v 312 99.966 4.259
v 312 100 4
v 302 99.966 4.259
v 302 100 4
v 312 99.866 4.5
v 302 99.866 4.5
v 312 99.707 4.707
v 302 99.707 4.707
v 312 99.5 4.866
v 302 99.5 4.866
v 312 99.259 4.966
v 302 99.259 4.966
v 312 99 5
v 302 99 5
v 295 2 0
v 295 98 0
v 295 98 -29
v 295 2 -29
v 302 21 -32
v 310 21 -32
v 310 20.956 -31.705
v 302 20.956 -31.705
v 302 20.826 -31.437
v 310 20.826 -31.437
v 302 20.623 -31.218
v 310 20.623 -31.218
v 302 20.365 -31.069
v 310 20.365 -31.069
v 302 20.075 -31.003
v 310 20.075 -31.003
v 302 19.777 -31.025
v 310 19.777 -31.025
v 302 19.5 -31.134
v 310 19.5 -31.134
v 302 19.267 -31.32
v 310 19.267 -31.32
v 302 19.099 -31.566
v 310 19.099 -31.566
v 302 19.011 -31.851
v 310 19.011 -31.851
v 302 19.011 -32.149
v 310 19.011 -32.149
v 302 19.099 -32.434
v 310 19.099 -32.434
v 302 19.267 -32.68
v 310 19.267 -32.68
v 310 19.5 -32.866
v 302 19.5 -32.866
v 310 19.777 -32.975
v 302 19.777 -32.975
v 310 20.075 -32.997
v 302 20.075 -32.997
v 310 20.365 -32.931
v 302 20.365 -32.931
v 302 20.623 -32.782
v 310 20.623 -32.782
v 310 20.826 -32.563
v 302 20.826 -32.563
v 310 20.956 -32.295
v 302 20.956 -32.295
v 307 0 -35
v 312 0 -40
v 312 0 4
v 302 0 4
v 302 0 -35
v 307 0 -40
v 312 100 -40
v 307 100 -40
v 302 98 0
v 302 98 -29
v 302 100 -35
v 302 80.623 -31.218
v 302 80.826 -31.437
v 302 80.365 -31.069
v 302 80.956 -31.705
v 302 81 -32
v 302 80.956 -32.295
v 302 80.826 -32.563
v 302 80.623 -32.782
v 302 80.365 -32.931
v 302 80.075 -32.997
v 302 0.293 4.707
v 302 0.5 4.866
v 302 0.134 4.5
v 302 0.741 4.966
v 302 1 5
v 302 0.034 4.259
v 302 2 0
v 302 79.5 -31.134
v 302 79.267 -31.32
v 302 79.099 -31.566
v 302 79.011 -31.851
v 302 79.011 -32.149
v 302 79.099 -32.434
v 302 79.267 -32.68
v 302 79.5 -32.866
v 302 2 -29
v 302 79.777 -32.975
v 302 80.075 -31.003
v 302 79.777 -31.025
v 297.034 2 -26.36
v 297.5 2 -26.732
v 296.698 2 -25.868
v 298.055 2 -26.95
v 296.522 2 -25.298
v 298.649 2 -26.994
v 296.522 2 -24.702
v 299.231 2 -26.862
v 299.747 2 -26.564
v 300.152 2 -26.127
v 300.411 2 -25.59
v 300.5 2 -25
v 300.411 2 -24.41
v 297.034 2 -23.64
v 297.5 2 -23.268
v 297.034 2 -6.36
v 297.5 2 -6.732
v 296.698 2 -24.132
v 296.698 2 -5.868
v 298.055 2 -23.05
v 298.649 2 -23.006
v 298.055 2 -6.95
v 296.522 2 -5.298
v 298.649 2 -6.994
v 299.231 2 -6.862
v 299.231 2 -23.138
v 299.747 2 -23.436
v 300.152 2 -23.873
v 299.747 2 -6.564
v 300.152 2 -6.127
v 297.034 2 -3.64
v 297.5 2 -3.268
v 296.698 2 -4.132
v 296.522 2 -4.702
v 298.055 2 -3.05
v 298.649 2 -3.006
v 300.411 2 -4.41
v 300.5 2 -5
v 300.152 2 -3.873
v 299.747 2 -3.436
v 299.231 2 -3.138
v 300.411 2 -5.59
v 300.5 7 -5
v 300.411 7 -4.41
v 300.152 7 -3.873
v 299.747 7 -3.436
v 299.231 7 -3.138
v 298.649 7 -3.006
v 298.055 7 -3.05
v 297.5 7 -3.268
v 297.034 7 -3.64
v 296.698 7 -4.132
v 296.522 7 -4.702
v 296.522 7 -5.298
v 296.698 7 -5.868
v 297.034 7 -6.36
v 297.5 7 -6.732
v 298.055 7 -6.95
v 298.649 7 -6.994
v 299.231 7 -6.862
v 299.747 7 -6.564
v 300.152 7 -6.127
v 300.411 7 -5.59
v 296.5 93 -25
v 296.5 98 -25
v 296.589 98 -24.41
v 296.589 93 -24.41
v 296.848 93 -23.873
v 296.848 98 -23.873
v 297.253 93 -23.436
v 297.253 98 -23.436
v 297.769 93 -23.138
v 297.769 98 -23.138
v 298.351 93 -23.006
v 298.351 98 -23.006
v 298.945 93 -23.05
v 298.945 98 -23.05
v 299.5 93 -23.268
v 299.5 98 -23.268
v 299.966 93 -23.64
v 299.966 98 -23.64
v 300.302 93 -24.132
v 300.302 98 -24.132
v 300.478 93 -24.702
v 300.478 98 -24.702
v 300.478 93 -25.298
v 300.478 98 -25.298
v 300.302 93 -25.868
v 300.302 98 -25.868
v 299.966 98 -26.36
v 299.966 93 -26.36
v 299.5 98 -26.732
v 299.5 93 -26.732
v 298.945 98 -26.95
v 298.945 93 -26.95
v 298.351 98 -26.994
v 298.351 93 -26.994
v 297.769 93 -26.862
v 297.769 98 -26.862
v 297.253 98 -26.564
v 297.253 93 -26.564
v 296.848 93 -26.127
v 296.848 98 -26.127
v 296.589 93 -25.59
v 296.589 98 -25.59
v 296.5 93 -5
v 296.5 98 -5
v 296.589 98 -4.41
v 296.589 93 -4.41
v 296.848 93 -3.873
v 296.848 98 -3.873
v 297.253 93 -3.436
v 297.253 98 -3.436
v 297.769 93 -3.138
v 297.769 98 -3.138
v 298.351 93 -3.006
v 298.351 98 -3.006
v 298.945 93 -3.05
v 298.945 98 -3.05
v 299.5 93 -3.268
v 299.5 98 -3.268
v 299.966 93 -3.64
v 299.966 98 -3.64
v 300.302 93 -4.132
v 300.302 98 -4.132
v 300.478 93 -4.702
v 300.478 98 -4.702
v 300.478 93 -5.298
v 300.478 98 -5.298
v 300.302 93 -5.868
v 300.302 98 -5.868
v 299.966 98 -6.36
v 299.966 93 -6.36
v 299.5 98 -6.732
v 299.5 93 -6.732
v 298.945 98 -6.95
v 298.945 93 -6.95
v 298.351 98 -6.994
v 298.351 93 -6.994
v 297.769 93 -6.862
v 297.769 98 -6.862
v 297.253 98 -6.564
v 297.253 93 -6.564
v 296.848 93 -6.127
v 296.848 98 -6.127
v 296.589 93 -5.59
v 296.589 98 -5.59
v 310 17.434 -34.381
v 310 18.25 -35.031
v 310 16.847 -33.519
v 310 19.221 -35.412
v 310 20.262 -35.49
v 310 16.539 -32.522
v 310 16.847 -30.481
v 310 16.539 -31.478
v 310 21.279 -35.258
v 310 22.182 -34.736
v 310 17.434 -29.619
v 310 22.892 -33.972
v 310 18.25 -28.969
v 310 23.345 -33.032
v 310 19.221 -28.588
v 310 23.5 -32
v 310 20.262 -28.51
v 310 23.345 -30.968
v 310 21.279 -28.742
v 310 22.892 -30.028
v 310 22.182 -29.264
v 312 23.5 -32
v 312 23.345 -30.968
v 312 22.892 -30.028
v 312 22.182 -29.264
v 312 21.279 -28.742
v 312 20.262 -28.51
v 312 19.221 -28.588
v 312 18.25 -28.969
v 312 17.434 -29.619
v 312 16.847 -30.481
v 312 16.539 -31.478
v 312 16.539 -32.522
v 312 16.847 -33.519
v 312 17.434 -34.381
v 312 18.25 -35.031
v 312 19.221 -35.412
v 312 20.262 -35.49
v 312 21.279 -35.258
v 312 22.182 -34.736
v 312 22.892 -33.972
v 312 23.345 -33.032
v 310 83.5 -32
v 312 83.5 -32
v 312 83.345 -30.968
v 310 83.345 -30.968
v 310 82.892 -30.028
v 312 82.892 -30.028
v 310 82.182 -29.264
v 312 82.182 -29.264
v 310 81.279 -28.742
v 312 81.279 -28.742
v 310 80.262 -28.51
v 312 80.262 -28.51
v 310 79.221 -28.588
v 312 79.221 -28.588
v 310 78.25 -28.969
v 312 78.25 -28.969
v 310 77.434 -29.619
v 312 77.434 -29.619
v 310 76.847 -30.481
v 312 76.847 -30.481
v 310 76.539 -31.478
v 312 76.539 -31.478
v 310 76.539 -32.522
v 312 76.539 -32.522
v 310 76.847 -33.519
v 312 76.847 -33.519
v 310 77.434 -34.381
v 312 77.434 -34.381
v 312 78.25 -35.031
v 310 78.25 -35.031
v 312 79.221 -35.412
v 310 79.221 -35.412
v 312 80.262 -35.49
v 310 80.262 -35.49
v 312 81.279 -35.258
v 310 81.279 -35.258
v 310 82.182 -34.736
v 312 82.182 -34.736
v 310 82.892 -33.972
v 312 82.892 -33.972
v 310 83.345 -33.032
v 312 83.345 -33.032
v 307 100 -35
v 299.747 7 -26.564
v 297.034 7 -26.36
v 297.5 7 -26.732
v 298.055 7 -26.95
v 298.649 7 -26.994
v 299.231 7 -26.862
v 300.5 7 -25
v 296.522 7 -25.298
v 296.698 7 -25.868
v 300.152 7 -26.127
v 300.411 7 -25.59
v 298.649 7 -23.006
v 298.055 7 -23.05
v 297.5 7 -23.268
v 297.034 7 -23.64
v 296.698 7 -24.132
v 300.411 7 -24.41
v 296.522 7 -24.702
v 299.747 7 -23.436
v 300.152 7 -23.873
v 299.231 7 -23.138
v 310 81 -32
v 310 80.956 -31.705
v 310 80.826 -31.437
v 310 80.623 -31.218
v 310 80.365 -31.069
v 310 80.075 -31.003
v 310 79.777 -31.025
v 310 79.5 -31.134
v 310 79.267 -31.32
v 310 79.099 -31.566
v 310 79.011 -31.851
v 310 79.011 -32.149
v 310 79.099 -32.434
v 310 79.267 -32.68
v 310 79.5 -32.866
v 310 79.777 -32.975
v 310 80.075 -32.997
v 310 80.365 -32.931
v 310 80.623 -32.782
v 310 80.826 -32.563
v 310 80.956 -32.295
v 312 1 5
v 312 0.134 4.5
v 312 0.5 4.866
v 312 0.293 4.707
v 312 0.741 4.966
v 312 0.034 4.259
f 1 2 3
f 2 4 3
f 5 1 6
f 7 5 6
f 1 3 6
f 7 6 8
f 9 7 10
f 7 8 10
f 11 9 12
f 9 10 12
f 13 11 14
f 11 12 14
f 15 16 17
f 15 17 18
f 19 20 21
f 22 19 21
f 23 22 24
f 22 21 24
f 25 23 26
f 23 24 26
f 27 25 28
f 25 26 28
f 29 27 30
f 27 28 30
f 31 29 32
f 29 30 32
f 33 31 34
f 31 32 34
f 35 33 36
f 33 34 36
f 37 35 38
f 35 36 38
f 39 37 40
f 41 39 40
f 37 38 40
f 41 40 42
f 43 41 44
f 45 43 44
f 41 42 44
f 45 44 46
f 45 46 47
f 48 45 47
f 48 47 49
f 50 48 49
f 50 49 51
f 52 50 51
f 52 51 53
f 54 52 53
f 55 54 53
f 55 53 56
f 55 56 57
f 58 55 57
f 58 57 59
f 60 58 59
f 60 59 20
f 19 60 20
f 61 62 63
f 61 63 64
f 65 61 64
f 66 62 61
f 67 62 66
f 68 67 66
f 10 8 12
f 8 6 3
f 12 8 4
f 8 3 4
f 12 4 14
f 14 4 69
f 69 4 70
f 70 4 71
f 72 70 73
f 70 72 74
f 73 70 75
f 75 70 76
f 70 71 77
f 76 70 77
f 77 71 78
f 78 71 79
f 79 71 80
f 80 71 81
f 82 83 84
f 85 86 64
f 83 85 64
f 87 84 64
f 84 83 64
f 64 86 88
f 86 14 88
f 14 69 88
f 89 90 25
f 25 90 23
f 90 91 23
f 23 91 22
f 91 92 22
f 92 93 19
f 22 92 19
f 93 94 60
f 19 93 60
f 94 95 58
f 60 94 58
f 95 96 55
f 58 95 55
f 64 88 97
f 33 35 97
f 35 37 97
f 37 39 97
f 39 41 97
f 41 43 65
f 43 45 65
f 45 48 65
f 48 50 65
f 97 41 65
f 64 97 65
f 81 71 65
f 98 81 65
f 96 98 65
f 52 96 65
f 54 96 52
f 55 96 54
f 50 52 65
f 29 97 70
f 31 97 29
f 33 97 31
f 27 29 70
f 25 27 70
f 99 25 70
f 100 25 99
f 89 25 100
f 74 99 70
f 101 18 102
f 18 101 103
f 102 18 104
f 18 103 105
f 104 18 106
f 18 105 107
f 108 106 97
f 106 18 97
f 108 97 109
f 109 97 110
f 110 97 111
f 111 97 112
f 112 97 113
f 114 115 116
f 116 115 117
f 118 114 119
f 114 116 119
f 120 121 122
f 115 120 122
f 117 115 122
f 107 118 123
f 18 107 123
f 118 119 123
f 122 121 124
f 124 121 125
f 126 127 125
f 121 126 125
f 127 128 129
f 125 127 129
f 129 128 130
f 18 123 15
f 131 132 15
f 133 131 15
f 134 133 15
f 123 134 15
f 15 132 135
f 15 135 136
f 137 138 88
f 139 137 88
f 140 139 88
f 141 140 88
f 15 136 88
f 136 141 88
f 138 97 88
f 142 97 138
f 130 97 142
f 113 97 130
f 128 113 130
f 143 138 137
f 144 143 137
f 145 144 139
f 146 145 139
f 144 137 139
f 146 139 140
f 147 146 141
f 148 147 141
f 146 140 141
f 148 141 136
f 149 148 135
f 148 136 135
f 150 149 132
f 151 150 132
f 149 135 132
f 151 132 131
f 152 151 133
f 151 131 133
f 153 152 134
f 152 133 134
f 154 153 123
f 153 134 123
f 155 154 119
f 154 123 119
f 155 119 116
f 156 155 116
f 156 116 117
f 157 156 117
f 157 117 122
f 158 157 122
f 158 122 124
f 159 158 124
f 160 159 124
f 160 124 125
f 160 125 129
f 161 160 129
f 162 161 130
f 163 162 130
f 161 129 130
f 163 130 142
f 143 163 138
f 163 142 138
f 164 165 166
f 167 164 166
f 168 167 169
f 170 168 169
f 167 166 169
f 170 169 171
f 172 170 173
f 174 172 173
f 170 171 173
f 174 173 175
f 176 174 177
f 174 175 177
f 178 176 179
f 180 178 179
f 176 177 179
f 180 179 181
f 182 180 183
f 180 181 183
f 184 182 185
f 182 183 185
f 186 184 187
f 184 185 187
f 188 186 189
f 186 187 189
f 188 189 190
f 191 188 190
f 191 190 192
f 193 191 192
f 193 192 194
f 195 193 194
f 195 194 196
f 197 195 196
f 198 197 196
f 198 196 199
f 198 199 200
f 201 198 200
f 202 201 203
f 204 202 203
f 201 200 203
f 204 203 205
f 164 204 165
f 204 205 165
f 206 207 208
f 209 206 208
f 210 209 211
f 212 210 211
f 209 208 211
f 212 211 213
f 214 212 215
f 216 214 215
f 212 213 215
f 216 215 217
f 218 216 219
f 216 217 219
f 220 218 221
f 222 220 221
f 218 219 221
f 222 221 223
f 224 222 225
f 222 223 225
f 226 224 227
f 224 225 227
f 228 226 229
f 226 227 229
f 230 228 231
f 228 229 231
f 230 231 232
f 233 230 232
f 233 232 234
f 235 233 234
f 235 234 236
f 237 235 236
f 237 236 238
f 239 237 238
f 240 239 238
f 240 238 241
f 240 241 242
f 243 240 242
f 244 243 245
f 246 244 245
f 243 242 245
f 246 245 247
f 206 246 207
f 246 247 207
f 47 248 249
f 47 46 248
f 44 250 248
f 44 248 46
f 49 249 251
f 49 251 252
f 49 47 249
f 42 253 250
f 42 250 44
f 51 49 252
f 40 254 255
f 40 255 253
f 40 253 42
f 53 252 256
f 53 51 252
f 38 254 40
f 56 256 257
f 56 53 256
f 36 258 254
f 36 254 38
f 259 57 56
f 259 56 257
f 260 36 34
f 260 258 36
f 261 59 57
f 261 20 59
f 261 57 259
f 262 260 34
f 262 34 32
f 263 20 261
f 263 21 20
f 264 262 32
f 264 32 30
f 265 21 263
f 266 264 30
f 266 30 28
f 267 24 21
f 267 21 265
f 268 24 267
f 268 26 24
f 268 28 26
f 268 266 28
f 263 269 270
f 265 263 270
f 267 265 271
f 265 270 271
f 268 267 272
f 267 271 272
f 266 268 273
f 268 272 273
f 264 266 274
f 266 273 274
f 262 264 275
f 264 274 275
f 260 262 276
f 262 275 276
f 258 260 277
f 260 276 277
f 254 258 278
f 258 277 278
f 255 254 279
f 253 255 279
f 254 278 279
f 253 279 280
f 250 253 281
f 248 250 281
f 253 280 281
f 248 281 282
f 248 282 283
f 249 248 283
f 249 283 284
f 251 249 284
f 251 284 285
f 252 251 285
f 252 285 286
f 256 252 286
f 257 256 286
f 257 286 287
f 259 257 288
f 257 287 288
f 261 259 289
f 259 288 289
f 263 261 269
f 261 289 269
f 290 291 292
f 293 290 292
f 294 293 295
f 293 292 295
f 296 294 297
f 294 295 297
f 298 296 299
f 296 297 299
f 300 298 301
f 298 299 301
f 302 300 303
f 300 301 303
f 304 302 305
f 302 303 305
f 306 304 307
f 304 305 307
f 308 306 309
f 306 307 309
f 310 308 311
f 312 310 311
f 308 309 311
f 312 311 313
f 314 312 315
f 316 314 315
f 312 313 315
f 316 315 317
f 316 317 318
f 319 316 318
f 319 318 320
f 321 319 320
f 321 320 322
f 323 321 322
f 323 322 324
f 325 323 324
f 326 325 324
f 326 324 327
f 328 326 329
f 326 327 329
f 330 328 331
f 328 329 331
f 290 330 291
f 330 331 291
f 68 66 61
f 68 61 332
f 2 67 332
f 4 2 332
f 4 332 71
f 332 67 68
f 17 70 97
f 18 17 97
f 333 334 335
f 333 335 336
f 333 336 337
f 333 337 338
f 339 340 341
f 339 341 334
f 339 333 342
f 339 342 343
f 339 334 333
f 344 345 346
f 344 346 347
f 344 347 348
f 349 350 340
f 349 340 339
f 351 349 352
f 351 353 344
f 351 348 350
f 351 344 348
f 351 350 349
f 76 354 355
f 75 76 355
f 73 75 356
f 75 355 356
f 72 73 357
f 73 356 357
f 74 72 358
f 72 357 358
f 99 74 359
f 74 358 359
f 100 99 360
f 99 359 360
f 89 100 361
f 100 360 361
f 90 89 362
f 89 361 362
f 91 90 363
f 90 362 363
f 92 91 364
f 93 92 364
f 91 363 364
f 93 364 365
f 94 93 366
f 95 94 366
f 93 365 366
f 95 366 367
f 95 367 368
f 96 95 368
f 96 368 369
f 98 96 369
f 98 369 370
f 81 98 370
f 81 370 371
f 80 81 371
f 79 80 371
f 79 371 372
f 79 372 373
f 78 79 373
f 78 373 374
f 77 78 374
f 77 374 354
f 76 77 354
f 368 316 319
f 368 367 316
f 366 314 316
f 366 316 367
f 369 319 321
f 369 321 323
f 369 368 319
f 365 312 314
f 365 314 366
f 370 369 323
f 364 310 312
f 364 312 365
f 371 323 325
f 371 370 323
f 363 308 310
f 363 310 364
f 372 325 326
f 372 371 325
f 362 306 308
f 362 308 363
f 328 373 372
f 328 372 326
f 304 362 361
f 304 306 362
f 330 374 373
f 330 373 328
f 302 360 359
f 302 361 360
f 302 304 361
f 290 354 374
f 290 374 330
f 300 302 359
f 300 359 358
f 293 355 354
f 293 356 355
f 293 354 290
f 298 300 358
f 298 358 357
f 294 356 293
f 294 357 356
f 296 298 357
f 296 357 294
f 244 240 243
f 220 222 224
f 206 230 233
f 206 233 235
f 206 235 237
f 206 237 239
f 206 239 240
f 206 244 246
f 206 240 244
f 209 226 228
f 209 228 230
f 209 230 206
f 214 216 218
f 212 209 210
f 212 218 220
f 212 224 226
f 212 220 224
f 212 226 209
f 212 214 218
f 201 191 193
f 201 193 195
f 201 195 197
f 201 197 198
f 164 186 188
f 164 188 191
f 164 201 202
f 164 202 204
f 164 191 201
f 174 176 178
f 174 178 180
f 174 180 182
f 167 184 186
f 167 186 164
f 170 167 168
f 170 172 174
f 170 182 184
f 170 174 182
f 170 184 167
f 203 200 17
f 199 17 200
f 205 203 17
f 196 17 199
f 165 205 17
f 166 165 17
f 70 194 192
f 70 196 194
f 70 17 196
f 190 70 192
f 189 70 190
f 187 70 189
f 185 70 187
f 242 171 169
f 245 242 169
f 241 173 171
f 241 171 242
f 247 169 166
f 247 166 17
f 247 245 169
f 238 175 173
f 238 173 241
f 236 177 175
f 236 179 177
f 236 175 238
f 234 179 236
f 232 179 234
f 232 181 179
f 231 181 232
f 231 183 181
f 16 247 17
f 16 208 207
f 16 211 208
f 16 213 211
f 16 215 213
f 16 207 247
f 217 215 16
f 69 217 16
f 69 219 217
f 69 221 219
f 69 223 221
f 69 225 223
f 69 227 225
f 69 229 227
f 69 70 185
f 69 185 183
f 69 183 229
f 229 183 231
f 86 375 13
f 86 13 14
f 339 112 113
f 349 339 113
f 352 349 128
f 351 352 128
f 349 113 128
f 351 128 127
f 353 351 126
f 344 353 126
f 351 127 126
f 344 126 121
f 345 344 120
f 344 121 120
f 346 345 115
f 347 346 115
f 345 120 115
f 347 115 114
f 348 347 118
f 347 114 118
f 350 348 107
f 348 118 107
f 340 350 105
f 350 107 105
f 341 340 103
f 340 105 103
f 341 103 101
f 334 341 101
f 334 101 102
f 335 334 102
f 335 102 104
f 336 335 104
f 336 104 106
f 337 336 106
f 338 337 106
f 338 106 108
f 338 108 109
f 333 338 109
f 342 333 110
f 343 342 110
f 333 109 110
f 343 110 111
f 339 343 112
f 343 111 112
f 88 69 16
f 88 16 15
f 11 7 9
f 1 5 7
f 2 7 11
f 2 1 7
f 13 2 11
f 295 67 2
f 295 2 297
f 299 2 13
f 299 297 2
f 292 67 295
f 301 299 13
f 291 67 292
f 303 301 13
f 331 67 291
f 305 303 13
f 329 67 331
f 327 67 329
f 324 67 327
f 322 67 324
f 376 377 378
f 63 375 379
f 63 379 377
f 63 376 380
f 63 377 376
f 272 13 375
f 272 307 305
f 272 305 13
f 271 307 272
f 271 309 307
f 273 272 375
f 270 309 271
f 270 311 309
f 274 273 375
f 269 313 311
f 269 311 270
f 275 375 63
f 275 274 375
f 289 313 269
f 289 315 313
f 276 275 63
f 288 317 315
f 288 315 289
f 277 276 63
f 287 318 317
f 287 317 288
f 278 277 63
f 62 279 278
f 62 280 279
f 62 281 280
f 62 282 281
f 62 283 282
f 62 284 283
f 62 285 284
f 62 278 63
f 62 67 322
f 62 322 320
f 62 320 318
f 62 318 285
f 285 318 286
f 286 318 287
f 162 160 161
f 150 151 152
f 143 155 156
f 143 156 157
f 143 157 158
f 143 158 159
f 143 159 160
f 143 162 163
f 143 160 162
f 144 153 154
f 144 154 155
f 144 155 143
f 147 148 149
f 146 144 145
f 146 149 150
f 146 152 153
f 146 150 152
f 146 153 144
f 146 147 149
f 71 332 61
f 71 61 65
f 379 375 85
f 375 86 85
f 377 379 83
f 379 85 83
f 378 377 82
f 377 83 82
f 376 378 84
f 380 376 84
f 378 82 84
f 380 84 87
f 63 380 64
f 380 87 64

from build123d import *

# Parameters (mm, degrees)
SKETCH005_W             = 10
SKETCH005_H             = 100
PAD003_DEPTH            = 45
SKETCH006_W             = 10
SKETCH006_H             = 100
POCKET002_DEPTH         = 5
SKETCH007_W             = 96
SKETCH007_H             = 29
PAD004_DEPTH            = 7
SKETCH014_R             = 1
POCKET007_DEPTH         = 10
SKETCH015_R             = 3.5
POCKET008_DEPTH         = 2
SKETCH016_R             = 2
POCKET009_DEPTH         = 5
SKETCH017_R             = 2
POCKET010_DEPTH         = 5
FILLET001_R             = 1
BODY003_PLACEMENT_ANGLE = 180


with BuildPart() as part:
    # Sketch005 → Pad003 (new body)
    with BuildSketch(Plane.XY):
        with Locations((5, 50)):
            Rectangle(SKETCH005_W, SKETCH005_H)
    extrude(amount=PAD003_DEPTH)

    # Sketch006 (on Face5 of Pad003) → Pocket002 (cut)
    with BuildSketch(Plane(origin=(0, 0, 0), x_dir=(1, 0, 0), z_dir=(0, 0, -1))):
        with Locations((10, -50)):
            Rectangle(SKETCH006_W, SKETCH006_H)
    extrude(amount=-POCKET002_DEPTH, mode=Mode.SUBTRACT)

    # Sketch007 (on Face5 of Pocket002) → Pad004 (join)
    with BuildSketch(Plane.YZ.offset(10)):
        with Locations((50, 25.5)):
            Rectangle(SKETCH007_W, SKETCH007_H)
    extrude(amount=PAD004_DEPTH)

    # Sketch014 (on Face7 of Pad004) → Pocket007 (cut)
    with BuildSketch(Plane(origin=(0, 0, 0), x_dir=(0, -1, 0), z_dir=(-1, 0, 0))):
        with Locations((-20, 8)):
            Circle(SKETCH014_R)
        with Locations((-80, 8)):
            Circle(SKETCH014_R)
    extrude(amount=-POCKET007_DEPTH, mode=Mode.SUBTRACT)

    # Sketch015 (on Face7 of Pocket007) → Pocket008 (cut)
    with BuildSketch(Plane(origin=(0, 0, 0), x_dir=(0, -1, 0), z_dir=(-1, 0, 0))):
        with Locations((-20, 8)):
            Circle(SKETCH015_R)
        with Locations((-80, 8)):
            Circle(SKETCH015_R)
    extrude(amount=-POCKET008_DEPTH, mode=Mode.SUBTRACT)

    # Sketch016 (on Face9 of Pocket008) → Pocket009 (cut)
    with BuildSketch(Plane.XZ.offset(-2)):
        with Locations((13.5, 15)):
            Circle(SKETCH016_R)
        with Locations((13.5, 35)):
            Circle(SKETCH016_R)
    extrude(amount=-POCKET009_DEPTH, mode=Mode.SUBTRACT)

    # Sketch017 (on Face12 of Pocket009) → Pocket010 (cut)
    with BuildSketch(Plane(origin=(0, 98, 0), x_dir=(-1, 0, 0), z_dir=(0, 1, 0))):
        with Locations((-13.5, 15)):
            Circle(SKETCH017_R)
        with Locations((-13.5, 35)):
            Circle(SKETCH017_R)
    extrude(amount=-POCKET010_DEPTH, mode=Mode.SUBTRACT)

    # Fillet001
    fillet001_edges = [part.edges().sort_by_distance(p)[0] for p in [
        (5, 0, 45),
        (5, 100, 45),
    ]]
    fillet(fillet001_edges, radius=FILLET001_R)


with BuildPart() as part_1:
    # Body002 placement: moved
    add(part.part.moved(Location((-10, 0, -40))))


with BuildPart() as part_2:
    # Body003 placement: moved
    add(part_1.part.moved(Location((302, 100, 0))).rotate(Axis((302, 100, 0), (0, 0, 1)), BODY003_PLACEMENT_ANGLE))


solid = part_2.part
